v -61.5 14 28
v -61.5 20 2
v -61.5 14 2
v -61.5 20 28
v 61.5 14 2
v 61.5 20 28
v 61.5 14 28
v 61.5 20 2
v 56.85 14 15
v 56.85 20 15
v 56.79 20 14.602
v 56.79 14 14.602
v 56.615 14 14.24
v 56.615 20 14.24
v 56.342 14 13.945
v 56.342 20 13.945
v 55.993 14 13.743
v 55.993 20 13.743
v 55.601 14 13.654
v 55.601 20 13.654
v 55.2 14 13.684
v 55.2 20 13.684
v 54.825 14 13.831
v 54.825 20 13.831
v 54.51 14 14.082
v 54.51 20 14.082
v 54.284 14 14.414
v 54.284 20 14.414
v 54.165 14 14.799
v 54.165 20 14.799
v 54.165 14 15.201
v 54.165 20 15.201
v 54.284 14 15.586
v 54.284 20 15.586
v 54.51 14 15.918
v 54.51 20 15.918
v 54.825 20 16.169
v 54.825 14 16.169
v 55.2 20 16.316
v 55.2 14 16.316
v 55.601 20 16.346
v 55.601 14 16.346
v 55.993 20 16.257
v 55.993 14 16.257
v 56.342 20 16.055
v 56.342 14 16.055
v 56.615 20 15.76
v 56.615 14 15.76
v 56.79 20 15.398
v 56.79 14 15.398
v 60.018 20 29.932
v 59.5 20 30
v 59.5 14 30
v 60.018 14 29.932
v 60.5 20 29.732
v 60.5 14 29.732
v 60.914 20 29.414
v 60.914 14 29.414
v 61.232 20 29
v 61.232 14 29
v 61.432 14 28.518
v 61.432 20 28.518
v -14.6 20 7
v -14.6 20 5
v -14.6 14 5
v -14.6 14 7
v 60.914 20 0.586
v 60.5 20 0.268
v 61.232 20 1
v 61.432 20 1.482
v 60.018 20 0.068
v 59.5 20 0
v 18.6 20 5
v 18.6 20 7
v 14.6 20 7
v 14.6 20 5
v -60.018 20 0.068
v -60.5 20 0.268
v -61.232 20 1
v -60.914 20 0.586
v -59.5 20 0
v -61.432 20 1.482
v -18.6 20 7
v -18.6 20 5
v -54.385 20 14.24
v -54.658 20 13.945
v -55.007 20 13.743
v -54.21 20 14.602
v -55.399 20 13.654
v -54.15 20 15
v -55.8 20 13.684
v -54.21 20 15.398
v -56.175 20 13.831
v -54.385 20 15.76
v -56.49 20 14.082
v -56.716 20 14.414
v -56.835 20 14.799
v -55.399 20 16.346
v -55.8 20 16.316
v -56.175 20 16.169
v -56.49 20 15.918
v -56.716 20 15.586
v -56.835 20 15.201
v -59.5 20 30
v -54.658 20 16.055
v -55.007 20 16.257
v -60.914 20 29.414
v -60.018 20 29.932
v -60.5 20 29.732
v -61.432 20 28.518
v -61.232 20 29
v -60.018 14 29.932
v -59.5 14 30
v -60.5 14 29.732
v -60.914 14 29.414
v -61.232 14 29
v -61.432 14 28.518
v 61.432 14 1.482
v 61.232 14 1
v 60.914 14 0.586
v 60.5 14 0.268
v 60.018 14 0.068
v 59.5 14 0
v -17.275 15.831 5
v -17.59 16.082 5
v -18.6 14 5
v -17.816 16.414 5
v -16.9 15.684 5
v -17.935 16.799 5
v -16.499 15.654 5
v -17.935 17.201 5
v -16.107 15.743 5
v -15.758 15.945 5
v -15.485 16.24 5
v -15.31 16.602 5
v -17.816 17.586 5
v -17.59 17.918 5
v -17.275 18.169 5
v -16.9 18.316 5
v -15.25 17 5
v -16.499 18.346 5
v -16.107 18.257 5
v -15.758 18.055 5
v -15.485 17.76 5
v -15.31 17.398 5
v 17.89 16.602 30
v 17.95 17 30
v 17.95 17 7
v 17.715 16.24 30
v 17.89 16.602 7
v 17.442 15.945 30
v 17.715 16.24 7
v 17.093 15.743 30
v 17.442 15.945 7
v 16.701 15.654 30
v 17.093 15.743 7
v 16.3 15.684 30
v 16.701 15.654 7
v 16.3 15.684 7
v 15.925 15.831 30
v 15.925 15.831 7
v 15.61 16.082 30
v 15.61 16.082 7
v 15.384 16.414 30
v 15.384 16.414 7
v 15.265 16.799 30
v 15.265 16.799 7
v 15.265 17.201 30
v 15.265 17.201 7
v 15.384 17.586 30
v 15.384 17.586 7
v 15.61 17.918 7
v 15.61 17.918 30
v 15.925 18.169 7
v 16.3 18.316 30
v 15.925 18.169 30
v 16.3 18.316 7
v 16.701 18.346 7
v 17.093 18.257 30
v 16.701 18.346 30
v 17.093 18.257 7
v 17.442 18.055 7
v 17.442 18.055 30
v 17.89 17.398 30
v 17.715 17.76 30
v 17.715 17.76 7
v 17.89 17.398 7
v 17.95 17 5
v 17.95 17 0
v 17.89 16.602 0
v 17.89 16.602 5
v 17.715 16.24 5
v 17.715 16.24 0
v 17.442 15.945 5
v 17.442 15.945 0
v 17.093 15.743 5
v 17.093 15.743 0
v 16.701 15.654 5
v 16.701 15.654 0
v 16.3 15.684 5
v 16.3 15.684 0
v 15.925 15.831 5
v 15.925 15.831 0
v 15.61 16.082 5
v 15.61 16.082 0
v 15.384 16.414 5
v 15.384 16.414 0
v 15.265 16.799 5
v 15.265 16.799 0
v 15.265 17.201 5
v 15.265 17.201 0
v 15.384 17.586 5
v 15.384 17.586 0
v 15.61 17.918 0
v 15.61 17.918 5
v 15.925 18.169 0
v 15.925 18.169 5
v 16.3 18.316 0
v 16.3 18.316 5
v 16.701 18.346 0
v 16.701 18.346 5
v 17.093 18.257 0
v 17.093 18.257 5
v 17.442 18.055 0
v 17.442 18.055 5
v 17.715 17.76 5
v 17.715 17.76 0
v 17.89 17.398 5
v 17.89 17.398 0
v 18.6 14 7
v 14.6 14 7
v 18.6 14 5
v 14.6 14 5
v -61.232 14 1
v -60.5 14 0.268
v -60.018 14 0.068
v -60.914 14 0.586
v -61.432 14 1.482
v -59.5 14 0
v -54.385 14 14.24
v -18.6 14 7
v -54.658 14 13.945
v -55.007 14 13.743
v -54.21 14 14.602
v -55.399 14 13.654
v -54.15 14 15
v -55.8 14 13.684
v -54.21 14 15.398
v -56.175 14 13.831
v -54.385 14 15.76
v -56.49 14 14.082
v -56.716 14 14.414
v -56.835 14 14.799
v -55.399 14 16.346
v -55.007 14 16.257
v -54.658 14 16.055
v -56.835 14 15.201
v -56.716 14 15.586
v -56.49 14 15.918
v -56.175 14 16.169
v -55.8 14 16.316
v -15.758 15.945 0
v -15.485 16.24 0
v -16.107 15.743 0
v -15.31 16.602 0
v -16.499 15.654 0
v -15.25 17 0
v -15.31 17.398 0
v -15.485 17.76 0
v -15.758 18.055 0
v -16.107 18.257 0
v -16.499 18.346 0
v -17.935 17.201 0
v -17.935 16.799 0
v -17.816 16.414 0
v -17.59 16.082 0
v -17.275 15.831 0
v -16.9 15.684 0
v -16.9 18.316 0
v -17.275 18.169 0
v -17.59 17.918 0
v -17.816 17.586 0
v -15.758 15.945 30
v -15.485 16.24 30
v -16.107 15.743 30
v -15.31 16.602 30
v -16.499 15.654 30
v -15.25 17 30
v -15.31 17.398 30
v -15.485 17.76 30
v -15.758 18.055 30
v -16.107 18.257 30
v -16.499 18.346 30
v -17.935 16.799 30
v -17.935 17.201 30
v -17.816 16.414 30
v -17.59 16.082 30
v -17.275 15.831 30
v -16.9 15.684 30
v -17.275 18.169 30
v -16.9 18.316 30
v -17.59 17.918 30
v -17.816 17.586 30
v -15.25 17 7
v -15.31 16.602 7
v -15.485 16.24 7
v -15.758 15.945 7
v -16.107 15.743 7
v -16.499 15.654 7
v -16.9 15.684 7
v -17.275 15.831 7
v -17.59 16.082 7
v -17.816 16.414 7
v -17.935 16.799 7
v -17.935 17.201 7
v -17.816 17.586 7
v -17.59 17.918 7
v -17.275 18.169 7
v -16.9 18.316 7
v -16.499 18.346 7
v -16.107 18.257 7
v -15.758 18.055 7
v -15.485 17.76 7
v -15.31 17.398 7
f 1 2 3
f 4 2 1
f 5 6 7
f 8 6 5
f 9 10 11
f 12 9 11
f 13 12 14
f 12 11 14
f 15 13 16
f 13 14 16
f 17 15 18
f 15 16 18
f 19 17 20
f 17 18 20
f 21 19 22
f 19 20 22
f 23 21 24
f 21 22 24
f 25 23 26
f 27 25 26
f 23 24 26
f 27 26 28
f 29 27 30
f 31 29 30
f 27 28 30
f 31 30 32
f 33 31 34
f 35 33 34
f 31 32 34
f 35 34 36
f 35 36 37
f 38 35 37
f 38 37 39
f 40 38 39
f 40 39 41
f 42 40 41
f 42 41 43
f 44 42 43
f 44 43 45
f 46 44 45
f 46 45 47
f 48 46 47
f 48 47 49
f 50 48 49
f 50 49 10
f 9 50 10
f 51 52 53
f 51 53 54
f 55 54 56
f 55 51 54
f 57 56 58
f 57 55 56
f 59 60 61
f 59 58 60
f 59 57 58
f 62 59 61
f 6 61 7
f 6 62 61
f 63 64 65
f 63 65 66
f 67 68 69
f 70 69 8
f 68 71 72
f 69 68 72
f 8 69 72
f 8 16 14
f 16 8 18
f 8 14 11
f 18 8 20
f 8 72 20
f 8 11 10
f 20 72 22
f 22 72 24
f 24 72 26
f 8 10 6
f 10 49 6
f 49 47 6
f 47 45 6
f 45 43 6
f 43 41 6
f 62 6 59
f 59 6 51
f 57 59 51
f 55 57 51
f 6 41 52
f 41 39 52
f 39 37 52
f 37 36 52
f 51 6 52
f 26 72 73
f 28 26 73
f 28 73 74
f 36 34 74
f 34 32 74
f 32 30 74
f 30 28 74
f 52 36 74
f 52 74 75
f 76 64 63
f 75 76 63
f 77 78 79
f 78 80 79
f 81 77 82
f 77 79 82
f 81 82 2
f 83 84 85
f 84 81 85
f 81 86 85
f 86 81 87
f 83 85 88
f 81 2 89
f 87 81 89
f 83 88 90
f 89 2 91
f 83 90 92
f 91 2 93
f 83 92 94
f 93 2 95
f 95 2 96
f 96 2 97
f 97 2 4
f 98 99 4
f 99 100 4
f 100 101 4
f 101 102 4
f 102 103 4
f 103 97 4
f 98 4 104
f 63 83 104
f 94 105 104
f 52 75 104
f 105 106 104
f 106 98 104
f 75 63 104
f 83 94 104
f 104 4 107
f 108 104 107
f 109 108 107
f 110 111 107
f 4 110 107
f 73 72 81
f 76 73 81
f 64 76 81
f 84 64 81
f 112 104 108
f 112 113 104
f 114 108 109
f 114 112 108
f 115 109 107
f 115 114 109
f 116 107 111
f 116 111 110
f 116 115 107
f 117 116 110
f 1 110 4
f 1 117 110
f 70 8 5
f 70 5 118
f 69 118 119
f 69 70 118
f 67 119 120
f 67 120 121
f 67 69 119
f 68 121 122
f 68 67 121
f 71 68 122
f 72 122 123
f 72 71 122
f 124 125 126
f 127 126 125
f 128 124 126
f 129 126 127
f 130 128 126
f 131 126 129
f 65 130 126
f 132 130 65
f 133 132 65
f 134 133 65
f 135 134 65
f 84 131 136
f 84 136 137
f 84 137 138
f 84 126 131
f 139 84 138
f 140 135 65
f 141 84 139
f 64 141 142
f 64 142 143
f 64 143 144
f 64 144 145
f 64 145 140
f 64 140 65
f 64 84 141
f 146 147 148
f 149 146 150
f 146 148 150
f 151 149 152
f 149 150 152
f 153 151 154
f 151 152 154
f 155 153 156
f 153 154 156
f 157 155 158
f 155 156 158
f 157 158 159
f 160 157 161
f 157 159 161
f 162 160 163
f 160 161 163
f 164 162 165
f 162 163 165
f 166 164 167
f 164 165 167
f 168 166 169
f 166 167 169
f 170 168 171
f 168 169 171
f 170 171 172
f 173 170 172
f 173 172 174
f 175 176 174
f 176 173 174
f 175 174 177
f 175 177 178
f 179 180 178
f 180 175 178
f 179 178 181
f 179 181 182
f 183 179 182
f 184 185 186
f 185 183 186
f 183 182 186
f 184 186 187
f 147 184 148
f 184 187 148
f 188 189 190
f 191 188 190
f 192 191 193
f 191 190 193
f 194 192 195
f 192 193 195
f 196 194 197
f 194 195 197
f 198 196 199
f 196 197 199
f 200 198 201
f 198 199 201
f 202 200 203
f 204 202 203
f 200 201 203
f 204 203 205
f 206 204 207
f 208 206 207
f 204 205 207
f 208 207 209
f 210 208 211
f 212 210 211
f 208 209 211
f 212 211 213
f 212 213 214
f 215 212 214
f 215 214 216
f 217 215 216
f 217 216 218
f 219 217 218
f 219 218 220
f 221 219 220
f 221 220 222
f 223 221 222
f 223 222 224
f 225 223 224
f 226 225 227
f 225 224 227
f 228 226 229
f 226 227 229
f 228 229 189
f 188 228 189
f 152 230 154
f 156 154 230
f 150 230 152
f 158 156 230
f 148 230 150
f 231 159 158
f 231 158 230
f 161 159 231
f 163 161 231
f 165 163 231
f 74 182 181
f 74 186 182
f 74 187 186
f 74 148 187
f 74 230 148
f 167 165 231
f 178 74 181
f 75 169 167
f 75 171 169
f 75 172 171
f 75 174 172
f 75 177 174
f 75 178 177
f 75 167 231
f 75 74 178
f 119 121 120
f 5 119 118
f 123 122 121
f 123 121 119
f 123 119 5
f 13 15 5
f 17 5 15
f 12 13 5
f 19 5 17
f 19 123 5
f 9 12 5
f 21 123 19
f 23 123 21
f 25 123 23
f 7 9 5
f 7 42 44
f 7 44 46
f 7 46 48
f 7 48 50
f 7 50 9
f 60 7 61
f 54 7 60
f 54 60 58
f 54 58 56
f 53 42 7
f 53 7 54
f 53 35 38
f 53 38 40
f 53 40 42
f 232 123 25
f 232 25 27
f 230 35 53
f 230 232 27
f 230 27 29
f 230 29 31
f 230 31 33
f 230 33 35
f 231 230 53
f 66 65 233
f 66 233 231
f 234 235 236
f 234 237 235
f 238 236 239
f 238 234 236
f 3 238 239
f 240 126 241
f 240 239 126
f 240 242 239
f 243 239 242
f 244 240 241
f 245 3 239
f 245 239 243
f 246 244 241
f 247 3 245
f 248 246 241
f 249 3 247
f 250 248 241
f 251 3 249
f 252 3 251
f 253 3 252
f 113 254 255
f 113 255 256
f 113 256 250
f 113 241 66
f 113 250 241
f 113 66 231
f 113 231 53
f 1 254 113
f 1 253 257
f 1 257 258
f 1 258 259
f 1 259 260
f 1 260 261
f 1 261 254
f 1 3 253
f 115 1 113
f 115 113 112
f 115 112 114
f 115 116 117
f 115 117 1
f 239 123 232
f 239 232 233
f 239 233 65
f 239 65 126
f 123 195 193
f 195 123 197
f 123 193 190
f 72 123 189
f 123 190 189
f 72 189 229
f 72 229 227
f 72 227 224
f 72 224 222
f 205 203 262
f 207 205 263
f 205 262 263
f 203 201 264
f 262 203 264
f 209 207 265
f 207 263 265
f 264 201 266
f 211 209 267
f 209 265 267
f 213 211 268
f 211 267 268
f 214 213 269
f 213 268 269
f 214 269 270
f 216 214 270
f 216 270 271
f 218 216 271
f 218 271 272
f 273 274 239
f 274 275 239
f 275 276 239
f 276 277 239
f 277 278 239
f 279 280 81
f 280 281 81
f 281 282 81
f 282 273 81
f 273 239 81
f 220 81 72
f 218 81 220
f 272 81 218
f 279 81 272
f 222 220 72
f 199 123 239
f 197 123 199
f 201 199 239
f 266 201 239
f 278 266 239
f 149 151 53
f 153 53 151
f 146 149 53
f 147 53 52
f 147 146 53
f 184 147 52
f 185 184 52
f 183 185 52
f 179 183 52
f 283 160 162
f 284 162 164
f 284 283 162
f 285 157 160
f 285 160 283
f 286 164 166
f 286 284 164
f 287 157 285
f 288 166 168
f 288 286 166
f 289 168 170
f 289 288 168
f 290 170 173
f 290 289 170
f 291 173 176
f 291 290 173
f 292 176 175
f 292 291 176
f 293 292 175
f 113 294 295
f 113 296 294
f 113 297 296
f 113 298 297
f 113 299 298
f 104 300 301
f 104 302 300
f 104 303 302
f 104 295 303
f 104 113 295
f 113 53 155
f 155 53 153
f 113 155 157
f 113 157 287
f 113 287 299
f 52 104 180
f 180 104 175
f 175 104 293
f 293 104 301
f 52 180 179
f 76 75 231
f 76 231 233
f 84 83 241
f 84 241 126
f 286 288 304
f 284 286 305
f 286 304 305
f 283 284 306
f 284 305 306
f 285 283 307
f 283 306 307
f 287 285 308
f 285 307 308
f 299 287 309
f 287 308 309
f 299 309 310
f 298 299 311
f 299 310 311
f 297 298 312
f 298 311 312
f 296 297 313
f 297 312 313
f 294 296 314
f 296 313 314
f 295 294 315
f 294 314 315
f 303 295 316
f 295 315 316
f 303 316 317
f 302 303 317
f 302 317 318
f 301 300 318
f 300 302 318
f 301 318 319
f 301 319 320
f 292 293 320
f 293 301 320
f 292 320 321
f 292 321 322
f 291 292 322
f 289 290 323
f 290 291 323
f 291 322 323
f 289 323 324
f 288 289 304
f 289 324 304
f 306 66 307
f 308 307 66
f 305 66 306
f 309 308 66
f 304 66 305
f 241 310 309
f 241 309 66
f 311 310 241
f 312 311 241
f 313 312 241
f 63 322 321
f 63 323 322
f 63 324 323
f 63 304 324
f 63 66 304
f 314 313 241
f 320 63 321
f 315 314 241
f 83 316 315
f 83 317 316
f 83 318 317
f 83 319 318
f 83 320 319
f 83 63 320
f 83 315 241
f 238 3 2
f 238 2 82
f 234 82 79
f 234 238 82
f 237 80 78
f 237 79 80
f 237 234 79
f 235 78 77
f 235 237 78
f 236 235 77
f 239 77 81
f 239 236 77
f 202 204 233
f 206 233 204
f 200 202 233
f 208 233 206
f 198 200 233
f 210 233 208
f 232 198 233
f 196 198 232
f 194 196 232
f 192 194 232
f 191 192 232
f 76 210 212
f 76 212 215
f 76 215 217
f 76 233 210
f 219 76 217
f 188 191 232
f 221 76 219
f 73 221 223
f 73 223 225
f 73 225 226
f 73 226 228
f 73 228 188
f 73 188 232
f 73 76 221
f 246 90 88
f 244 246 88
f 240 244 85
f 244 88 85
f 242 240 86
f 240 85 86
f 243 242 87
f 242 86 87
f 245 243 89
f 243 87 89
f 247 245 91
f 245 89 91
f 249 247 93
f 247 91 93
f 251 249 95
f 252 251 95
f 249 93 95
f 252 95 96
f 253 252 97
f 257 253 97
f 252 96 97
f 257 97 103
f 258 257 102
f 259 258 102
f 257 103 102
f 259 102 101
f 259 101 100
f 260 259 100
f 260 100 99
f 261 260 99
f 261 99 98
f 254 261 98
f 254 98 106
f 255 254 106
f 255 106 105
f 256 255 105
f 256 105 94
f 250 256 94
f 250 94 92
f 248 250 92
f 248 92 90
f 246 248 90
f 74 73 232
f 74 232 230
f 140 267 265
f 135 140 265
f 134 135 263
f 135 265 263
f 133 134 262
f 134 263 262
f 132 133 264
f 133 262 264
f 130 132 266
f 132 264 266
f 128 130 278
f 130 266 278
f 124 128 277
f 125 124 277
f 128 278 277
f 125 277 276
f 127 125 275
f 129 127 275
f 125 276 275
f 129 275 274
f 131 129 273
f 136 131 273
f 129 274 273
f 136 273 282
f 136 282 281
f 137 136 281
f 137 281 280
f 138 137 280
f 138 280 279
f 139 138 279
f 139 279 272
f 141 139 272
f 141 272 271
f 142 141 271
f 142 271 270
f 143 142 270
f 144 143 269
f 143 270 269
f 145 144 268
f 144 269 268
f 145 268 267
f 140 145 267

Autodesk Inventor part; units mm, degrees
ref_plane "YZ Plane" through (0, 0, 0) normal (1, 0, 0) x (0, 1, 0)
ref_plane "XZ Plane" through (0, 0, 0) normal (0, 1, 0) x (-1, 0, 0)
ref_plane "XY Plane" through (0, 0, 0) normal (0, 0, 1) x (1, 0, 0)
ref_plane "작업 평면1" through (0, 0, 0) normal (0, 0, 1) x (1, 0, 0)
sketch "스케치1" plane through (0, 0, 0) normal (0, 0, 1) x (1, 0, 0)
  circle A0 centre (16.6, 17) radius 1.35 projected
  circle A1 centre (-16.6, 17) radius 1.35 projected
  line L0 (-49.8, -20) -> (49.8, -20) projected
  line L1 (49.8, -20) -> (49.8, 20) projected
  line L2 (49.8, 20) -> (-49.8, 20) projected
  line L3 (-49.8, 20) -> (-49.8, -20) projected
  circle A2 centre (40.6, -17) radius 1.35 projected
  circle A3 centre (30.7755, -17) radius 1.35 projected
  circle A4 centre (-40.6, -17) radius 1.35 projected
  circle A5 centre (-30.7755, -17) radius 1.35 projected
  line L4 (-49.8, 20) -> (-49.8, 14)
  line L5 (-49.8, 14) -> (49.8, 14)
  point P0 (0, 0)
  dimension "d0" = 6
extrude "돌출1" add sketch "스케치1" along normal blind 30 contours L3 L2 L1 L5
sketch "스케치2" plane through (-49.8, 20, 0) normal (0, 1, 0) x (1, 0, 0)
  line L0 (34.55, -30) -> (34.55, 0) projected
  line L1 (31.85, -30) -> (31.85, 0) projected
  line L2 (65.05, -30) -> (65.05, 0) projected
  line L3 (67.75, -30) -> (67.75, 0) projected
  line L4 (67.75, 0) -> (67.75, -6)
  line L5 (67.75, -6) -> (31.85, -6)
  line L6 (67.75, -6) -> (66.4, -6)
  line L7 (34.55, -6) -> (33.2, -6)
  line L8 (64.4, -5) -> (68.4, -5)
  line L9 (68.4, -5) -> (68.4, -7)
  line L10 (68.4, -7) -> (64.4, -7)
  line L11 (64.4, -7) -> (64.4, -5)
  line L12 (64.4, -5) -> (68.4, -7) construction
  line L13 (68.4, -5) -> (64.4, -7) construction
  line L14 (31.2, -5) -> (35.2, -5)
  line L15 (35.2, -5) -> (35.2, -7)
  line L16 (35.2, -7) -> (31.2, -7)
  line L17 (31.2, -7) -> (31.2, -5)
  line L18 (31.2, -5) -> (35.2, -7) construction
  line L19 (35.2, -5) -> (31.2, -7) construction
  point P0 (49.8, 0)
  point P1 (65.05, -6)
  dimension "d3" = 6
  dimension "d4" = 1.35
  dimension "d5" = 1.35
  dimension "d6" = 4
  dimension "d7" = 2
  dimension "d8" = 4
  dimension "d9" = 2
extrude "돌출2" cut sketch "스케치2" against normal up to surface (6 mm away)
sketch "스케치3" plane through (-49.8, 14, 0) normal (-1, 0, 0) x (0, 0, 1)
  line L0 (0, 6) -> (0, 0) projected
  line L1 (0, 0) -> (30, 0) projected
  line L2 (30, 6) -> (30, 0) projected
  line L3 (0, 6) -> (30, 6) projected
  point P0 (0, -14)
extrude "돌출3" add sketch "스케치3" along normal blind 11.7
sketch "스케치4" plane through (49.8, 14, 0) normal (1, 0, 0) x (0, 0, -1)
  line L0 (0, 0) -> (0, 6) projected
  line L1 (0, 6) -> (-30, 6) projected
  line L2 (-30, 0) -> (-30, 6) projected
  line L3 (0, 0) -> (-30, 0) projected
  point P0 (0, -14)
extrude "돌출4" add sketch "스케치4" along normal blind 11.7
sketch "스케치5" plane through (-61.5, 20, 30) normal (0, 1, 0) x (1, 0, 0)
  line L0 (42.9, 25) -> (46.9, 25) projected
  line L1 (46.9, 25) -> (46.9, 23) projected
  line L2 (46.9, 23) -> (42.9, 23) projected
  line L3 (42.9, 23) -> (42.9, 25) projected
  line L4 (80.1, 25) -> (80.1, 23) projected
  line L5 (80.1, 23) -> (76.1, 23) projected
  line L6 (76.1, 23) -> (76.1, 25) projected
  line L7 (76.1, 25) -> (80.1, 25) projected
  line L8 (0, 30) -> (123, 30) projected
  line L9 (0, 0) -> (0, 30) projected
  line L10 (0, 0) -> (123, 0) projected
  line L11 (123, 30) -> (123, 0) projected
  line L12 (0, 30) -> (3, 30)
  line L13 (3, 30) -> (3, 0)
  line L14 (123, 30) -> (120, 30)
  line L15 (120, 30) -> (120, 0)
  line L16 (0, 15) -> (123, 15)
  line L17 (3, 15) -> (3, 11)
  line L18 (3, 11) -> (123, 11)
  line L19 (3, 11) -> (3, 19)
  line L20 (3, 19) -> (9, 19)
  line L21 (9, 19) -> (9, 11)
  line L22 (9, 11) -> (3, 11)
  line L23 (120, 11) -> (120, 19)
  line L24 (120, 19) -> (114, 19)
  line L25 (114, 19) -> (114, 11)
  line L26 (114, 11) -> (120, 11)
  line L27 (3, 19) -> (9, 11)
  line L28 (3, 11) -> (9, 19)
  line L29 (114, 19) -> (120, 11)
  line L30 (114, 11) -> (120, 19)
  circle A0 centre (6, 15) radius 1.35
  circle A1 centre (117, 15) radius 1.35
  point P0 (61.5, 30)
  point P1 (120, 15)
  point P2 (9, 11)
  dimension "d16" = 3
  dimension "d17" = 3
  dimension "d18" = 4
  dimension "d19" = 8
  dimension "d20" = 6
  dimension "d21" = 6
  dimension "d24" = 2.7
  dimension "d25" = 2.7
extrude "돌출6" cut sketch "스케치5" against normal up to surface (6 mm away) contours A0 L28 L27 | L27 L16 A0 | L16 L28 A0 | A1 L16 L30 | L30 L29 A1 | A0 L16 L28 | L16 A0 L27 | L27 A0 L28 | A1 L29 L16 | L29 L16 A1 | L30 A1 L16 | L29 A1 L30
fillet "모깎기1" radius 2 4 edges at (61.5, 17, 30) (61.5, 17, 0) (-61.5, 17, 0) (-61.5, 17, 30)
properties part number "_battery_adt_2_"
